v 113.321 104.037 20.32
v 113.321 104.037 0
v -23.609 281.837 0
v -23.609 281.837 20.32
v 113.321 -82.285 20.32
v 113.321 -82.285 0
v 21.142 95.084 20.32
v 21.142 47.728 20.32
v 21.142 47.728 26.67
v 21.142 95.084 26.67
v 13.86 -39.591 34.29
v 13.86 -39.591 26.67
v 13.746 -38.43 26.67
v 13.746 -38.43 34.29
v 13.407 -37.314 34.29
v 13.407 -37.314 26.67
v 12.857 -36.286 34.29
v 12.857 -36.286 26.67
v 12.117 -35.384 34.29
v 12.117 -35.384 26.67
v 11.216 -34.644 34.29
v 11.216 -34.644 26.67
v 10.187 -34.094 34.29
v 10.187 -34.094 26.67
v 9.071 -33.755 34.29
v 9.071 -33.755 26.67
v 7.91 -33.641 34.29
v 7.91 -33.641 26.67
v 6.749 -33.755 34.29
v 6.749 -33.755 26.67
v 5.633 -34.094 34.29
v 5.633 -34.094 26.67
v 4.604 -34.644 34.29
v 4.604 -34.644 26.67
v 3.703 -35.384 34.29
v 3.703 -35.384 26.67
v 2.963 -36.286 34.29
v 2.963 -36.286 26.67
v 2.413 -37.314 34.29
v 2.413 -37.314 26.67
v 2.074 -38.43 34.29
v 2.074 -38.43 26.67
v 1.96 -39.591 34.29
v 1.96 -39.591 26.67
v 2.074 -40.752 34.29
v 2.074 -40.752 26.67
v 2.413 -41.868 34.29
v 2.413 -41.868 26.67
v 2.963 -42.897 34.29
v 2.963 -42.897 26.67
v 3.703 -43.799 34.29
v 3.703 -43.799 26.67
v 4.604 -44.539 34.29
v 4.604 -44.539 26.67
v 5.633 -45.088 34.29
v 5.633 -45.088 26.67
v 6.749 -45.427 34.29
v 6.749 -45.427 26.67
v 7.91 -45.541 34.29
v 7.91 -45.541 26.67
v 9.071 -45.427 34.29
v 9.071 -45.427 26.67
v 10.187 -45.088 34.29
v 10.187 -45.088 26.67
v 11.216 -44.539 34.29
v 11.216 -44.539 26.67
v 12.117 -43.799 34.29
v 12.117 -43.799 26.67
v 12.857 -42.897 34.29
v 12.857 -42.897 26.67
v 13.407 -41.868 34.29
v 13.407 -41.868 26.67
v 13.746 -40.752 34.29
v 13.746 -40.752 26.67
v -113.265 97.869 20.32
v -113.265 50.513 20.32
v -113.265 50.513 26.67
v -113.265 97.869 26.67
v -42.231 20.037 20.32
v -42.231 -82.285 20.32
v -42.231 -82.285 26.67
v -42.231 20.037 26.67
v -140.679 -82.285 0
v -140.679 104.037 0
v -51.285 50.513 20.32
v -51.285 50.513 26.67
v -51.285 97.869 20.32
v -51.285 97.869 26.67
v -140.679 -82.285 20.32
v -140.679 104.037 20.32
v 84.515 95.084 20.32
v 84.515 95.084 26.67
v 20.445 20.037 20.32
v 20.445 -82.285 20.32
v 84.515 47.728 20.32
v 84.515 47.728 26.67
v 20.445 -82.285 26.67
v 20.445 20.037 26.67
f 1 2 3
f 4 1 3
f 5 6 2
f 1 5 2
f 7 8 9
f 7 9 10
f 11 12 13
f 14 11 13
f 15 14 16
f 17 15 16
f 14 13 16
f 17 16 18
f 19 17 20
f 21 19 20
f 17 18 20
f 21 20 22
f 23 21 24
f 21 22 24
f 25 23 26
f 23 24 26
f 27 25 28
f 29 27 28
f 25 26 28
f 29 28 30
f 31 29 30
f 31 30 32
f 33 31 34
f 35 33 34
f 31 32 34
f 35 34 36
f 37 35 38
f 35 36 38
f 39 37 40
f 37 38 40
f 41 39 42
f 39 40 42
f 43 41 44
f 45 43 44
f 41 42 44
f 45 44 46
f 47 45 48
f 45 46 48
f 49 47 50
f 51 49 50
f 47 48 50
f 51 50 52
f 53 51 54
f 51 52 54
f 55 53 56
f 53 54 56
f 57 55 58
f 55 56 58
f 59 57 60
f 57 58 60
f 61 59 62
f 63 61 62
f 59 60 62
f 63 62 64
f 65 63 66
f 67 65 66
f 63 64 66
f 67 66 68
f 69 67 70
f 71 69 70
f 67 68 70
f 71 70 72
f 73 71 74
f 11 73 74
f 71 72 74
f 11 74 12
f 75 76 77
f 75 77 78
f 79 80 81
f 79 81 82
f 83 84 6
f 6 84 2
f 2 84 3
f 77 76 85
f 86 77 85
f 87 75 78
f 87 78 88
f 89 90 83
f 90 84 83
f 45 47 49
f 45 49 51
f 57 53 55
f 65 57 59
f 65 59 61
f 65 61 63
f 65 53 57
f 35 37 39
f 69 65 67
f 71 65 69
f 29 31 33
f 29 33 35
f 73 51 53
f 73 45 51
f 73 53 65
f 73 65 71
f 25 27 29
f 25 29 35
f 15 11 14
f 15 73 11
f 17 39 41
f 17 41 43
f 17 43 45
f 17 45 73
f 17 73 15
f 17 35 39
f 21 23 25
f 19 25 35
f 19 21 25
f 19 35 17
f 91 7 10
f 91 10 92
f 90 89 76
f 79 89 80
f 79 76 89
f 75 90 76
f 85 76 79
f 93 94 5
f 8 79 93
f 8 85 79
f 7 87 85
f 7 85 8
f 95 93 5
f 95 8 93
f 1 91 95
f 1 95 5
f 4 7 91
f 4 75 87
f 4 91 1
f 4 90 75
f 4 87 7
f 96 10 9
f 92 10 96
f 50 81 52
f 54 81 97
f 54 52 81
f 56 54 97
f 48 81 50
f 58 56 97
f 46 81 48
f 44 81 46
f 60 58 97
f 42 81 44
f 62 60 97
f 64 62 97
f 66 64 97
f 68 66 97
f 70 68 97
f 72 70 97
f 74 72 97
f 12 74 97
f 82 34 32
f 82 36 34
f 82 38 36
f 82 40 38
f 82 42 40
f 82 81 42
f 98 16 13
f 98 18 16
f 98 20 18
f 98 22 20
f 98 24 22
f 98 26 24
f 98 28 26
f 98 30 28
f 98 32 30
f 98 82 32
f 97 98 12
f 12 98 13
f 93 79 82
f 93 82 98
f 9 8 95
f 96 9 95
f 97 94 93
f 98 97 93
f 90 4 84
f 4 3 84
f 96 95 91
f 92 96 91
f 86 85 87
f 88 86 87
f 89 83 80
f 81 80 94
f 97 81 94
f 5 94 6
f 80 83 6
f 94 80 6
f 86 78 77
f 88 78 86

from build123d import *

# Parameters (mm, degrees)
F2_DEPTH  = 5.08
F1_W      = 52.124873735
F1_H      = 98.4580833465
F1_W_2    = 54.0554076433
F1_H_2    = 52.1248690784
F1_W_3    = 53.0901476741
F1_H_3    = 52.1248728037
F3_DEPTH  = 7.62
F4_DEPTH  = 7.62
F5_W      = 62.6767296344
F5_H      = 102.3222543299
F6_DEPTH  = 6.35
F7_R      = 5.9501097349
F8_DEPTH  = 7.62
F9_W      = 61.9803220034
F9_H      = 47.3557561636
F9_W_2    = 63.3731409907
F9_H_2    = 47.3557598889
F10_DEPTH = 6.35


with BuildPart() as f2:
    # F0 (on Top) → F2 (new body)
    with BuildSketch(Plane.XY):
        Polygon((-23.608982563, 281.8368527174), (-140.678524971, 104.0368527174), (-66.4795190096, 104.0368527174), (-61.5329220891, 104.0368527174), (-23.608982563, 104.0368527174), align=None)
        Polygon((113.321475029, 104.0368527174), (-23.608982563, 281.8368527174), (-23.608982563, 104.0368527174), align=None)
        Polygon((-66.4795190096, 104.0368527174), (-140.678524971, 104.0368527174), (-140.678524971, -82.2851061821), (113.321475029, -82.2851061821), (113.321475029, 104.0368527174), (-23.608982563, 104.0368527174), (-61.5329220891, 104.0368527174), align=None)
    extrude(amount=F2_DEPTH)

    # F1 (on face) + F2_face (on face) → F3 (join)
    with BuildSketch(Plane.XY):
        with Locations((-13.7297245674, -28.9409598336)):
            Rectangle(F1_W, F1_H)
        with Locations((58.6659163237, 62.7601984888)):
            Rectangle(F1_W_2, F1_H_2)
        with Locations((-93.3649428189, 57.9338222742)):
            Rectangle(F1_W_3, F1_H_3)
    with BuildSketch(Plane(origin=(-14.7477440157, 60.1118346493, 5.08), x_dir=(1, 0, 0), z_dir=(0, 0, 1))):
        Polygon((-8.8612385473, 221.7250180681), (-125.9307809553, 43.9250180681), (-125.9307809553, -142.3969408314), (128.0692190447, -142.3969408314), (128.0692190447, 43.9250180681), align=None)
    extrude(amount=F3_DEPTH)

    # F1 (on face) + F3_face (on face) → F4 (join)
    with BuildSketch(Plane.XY):
        with Locations((-13.7297245674, -28.9409598336)):
            Rectangle(F1_W, F1_H)
        with Locations((58.6659163237, 62.7601984888)):
            Rectangle(F1_W_2, F1_H_2)
        with Locations((-93.3649428189, 57.9338222742)):
            Rectangle(F1_W_3, F1_H_3)
    with BuildSketch(Plane(origin=(-14.7477440157, 60.1118346493, 12.7), x_dir=(1, 0, 0), z_dir=(0, 0, 1))):
        Polygon((128.0692190447, 43.9250180681), (-8.8612385473, 221.7250180681), (-125.9307809553, 43.9250180681), (-125.9307809553, -142.3969408314), (128.0692190447, -142.3969408314), align=None)
    extrude(amount=F4_DEPTH)

    # F5 (on face) → F6 (join)
    with BuildSketch(Plane.XY.offset(20.32)):
        with Locations((-10.8928931877, -31.1239790171)):
            Rectangle(F5_W, F5_H)
    extrude(amount=F6_DEPTH)

    # F7 (on face) → F8 (join)
    with BuildSketch(Plane.XY.offset(26.67)):
        with Locations((7.9101277515, -39.591267705)):
            Circle(F7_R)
    extrude(amount=F8_DEPTH)

    # F9 (on face) → F10 (join)
    with BuildSketch(Plane.XY.offset(20.32)):
        with Locations((-82.2747275233, 74.1913020611)):
            Rectangle(F9_W, F9_H)
        with Locations((52.8284572065, 71.4056696743)):
            Rectangle(F9_W_2, F9_H_2)
    extrude(amount=F10_DEPTH)


solid = f2.part
